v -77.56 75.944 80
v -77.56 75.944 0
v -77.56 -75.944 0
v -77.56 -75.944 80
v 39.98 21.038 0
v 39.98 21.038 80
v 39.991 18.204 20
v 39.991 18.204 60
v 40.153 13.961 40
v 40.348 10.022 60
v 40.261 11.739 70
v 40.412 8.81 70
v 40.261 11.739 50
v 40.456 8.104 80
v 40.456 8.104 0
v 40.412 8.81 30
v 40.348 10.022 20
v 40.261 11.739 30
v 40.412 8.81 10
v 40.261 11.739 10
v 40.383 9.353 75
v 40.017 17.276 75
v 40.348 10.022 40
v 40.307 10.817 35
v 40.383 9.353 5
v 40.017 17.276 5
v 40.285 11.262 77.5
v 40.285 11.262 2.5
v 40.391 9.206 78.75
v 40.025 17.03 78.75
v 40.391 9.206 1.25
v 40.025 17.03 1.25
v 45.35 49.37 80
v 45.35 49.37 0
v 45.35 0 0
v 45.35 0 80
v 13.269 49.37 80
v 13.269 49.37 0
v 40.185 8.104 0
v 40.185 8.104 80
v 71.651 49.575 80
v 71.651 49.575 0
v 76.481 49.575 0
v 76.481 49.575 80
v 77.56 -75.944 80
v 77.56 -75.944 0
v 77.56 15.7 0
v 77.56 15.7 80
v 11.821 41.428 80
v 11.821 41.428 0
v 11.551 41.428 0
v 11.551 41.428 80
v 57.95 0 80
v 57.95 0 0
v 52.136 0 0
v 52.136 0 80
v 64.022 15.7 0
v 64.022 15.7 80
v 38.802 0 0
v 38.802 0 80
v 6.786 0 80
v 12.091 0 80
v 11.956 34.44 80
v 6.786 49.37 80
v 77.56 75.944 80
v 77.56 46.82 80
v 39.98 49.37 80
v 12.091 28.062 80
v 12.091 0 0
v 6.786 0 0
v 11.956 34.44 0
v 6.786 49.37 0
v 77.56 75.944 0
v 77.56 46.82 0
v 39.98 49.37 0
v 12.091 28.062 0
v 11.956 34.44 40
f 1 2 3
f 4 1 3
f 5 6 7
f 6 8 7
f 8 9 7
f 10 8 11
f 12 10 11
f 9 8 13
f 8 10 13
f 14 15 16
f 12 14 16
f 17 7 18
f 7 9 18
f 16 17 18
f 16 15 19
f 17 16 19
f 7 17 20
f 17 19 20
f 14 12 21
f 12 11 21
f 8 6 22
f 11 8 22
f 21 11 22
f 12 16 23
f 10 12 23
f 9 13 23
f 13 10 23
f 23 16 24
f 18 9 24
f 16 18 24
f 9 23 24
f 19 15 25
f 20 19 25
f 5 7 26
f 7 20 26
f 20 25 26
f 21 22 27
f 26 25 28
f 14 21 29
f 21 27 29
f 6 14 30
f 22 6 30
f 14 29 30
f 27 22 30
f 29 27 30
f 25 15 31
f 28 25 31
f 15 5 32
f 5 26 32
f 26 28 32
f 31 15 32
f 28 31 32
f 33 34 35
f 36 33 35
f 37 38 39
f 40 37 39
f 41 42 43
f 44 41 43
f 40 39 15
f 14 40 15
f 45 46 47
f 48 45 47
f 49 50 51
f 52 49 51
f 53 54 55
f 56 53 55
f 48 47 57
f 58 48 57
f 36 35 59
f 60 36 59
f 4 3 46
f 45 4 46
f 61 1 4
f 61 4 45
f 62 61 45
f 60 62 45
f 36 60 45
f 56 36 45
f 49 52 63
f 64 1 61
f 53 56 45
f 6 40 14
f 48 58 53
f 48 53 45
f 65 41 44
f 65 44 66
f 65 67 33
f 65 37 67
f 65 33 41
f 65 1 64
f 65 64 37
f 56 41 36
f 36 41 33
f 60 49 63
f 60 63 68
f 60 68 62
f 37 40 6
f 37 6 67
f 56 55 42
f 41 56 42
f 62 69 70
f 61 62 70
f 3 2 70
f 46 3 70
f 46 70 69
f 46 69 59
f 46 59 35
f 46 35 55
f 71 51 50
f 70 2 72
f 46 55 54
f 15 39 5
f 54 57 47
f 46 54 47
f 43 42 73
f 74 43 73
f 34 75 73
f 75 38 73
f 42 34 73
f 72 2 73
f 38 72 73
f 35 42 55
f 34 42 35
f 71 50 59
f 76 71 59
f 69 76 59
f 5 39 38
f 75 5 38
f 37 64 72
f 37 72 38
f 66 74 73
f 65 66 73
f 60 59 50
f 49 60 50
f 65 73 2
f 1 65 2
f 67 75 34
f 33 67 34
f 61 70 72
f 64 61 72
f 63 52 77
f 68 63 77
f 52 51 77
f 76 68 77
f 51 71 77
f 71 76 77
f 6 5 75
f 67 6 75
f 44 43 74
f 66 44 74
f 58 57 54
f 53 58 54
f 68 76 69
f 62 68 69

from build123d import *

# Parameters (mm, degrees)
F1_DEPTH = 80


with BuildPart() as f1:
    # F0 (on Top) → F1 (new body)
    with BuildSketch(Plane.XY):
        Polygon((77.5599744916, 46.8204599889), (77.5599744916, 75.9442564845), (-77.5599744916, 75.9442564845), (-77.5599744916, -75.9442564845), (77.5599744916, -75.9442564845), (77.5599744916, 15.7003122036), (64.0222641474, 15.7003122036), (57.9496038182, 0), (52.1362741791, 0), (71.650908618, 49.5753836132), (76.4809427233, 49.5753836132), align=None)
        with BuildLine():
            Line((45.3504544518, 49.3700801502), (45.3504544518, 0))
            Line((45.3504544518, 0), (38.8023545238, 0))
            Line((38.8023545238, 0), (11.8211572957, 41.4280777622))
            Line((11.8211572957, 41.4280777622), (11.5510211601, 41.4280777622))
            add(Edge.make_bspline(
                [(11.5510211601, 41.4280777622), (12.0912934314, 34.1344020999), (12.0912934314, 28.0617417706)],
                knots=[0, 0, 0, 1, 1, 1], degree=2))
            Line((12.0912934314, 28.0617417706), (12.0912934314, 0))
            Line((12.0912934314, 0), (6.7858197274, 0))
            Line((6.7858197274, 0), (6.7858197274, 49.3700801502))
            Line((6.7858197274, 49.3700801502), (13.2690869828, 49.3700801502))
            Line((13.2690869828, 49.3700801502), (40.1854515383, 8.1040840693))
            Line((40.1854515383, 8.1040840693), (40.4555876739, 8.1040840693))
            add(Edge.make_bspline(
                [(40.4555876739, 8.1040840693), (40.3907550014, 9.0117414851), (40.153035202, 13.96063549)],
                knots=[0, 0, 0, 1, 1, 1], degree=2))
            add(Edge.make_bspline(
                [(40.153035202, 13.96063549), (39.9153154026, 18.909529495), (39.9801480752, 21.0382022439)],
                knots=[0, 0, 0, 1, 1, 1], degree=2))
            Line((39.9801480752, 21.0382022439), (39.9801480752, 49.3700801502))
            Line((39.9801480752, 49.3700801502), (45.3504544518, 49.3700801502))
        make_face(mode=Mode.SUBTRACT)
    extrude(amount=F1_DEPTH)


solid = f1.part
